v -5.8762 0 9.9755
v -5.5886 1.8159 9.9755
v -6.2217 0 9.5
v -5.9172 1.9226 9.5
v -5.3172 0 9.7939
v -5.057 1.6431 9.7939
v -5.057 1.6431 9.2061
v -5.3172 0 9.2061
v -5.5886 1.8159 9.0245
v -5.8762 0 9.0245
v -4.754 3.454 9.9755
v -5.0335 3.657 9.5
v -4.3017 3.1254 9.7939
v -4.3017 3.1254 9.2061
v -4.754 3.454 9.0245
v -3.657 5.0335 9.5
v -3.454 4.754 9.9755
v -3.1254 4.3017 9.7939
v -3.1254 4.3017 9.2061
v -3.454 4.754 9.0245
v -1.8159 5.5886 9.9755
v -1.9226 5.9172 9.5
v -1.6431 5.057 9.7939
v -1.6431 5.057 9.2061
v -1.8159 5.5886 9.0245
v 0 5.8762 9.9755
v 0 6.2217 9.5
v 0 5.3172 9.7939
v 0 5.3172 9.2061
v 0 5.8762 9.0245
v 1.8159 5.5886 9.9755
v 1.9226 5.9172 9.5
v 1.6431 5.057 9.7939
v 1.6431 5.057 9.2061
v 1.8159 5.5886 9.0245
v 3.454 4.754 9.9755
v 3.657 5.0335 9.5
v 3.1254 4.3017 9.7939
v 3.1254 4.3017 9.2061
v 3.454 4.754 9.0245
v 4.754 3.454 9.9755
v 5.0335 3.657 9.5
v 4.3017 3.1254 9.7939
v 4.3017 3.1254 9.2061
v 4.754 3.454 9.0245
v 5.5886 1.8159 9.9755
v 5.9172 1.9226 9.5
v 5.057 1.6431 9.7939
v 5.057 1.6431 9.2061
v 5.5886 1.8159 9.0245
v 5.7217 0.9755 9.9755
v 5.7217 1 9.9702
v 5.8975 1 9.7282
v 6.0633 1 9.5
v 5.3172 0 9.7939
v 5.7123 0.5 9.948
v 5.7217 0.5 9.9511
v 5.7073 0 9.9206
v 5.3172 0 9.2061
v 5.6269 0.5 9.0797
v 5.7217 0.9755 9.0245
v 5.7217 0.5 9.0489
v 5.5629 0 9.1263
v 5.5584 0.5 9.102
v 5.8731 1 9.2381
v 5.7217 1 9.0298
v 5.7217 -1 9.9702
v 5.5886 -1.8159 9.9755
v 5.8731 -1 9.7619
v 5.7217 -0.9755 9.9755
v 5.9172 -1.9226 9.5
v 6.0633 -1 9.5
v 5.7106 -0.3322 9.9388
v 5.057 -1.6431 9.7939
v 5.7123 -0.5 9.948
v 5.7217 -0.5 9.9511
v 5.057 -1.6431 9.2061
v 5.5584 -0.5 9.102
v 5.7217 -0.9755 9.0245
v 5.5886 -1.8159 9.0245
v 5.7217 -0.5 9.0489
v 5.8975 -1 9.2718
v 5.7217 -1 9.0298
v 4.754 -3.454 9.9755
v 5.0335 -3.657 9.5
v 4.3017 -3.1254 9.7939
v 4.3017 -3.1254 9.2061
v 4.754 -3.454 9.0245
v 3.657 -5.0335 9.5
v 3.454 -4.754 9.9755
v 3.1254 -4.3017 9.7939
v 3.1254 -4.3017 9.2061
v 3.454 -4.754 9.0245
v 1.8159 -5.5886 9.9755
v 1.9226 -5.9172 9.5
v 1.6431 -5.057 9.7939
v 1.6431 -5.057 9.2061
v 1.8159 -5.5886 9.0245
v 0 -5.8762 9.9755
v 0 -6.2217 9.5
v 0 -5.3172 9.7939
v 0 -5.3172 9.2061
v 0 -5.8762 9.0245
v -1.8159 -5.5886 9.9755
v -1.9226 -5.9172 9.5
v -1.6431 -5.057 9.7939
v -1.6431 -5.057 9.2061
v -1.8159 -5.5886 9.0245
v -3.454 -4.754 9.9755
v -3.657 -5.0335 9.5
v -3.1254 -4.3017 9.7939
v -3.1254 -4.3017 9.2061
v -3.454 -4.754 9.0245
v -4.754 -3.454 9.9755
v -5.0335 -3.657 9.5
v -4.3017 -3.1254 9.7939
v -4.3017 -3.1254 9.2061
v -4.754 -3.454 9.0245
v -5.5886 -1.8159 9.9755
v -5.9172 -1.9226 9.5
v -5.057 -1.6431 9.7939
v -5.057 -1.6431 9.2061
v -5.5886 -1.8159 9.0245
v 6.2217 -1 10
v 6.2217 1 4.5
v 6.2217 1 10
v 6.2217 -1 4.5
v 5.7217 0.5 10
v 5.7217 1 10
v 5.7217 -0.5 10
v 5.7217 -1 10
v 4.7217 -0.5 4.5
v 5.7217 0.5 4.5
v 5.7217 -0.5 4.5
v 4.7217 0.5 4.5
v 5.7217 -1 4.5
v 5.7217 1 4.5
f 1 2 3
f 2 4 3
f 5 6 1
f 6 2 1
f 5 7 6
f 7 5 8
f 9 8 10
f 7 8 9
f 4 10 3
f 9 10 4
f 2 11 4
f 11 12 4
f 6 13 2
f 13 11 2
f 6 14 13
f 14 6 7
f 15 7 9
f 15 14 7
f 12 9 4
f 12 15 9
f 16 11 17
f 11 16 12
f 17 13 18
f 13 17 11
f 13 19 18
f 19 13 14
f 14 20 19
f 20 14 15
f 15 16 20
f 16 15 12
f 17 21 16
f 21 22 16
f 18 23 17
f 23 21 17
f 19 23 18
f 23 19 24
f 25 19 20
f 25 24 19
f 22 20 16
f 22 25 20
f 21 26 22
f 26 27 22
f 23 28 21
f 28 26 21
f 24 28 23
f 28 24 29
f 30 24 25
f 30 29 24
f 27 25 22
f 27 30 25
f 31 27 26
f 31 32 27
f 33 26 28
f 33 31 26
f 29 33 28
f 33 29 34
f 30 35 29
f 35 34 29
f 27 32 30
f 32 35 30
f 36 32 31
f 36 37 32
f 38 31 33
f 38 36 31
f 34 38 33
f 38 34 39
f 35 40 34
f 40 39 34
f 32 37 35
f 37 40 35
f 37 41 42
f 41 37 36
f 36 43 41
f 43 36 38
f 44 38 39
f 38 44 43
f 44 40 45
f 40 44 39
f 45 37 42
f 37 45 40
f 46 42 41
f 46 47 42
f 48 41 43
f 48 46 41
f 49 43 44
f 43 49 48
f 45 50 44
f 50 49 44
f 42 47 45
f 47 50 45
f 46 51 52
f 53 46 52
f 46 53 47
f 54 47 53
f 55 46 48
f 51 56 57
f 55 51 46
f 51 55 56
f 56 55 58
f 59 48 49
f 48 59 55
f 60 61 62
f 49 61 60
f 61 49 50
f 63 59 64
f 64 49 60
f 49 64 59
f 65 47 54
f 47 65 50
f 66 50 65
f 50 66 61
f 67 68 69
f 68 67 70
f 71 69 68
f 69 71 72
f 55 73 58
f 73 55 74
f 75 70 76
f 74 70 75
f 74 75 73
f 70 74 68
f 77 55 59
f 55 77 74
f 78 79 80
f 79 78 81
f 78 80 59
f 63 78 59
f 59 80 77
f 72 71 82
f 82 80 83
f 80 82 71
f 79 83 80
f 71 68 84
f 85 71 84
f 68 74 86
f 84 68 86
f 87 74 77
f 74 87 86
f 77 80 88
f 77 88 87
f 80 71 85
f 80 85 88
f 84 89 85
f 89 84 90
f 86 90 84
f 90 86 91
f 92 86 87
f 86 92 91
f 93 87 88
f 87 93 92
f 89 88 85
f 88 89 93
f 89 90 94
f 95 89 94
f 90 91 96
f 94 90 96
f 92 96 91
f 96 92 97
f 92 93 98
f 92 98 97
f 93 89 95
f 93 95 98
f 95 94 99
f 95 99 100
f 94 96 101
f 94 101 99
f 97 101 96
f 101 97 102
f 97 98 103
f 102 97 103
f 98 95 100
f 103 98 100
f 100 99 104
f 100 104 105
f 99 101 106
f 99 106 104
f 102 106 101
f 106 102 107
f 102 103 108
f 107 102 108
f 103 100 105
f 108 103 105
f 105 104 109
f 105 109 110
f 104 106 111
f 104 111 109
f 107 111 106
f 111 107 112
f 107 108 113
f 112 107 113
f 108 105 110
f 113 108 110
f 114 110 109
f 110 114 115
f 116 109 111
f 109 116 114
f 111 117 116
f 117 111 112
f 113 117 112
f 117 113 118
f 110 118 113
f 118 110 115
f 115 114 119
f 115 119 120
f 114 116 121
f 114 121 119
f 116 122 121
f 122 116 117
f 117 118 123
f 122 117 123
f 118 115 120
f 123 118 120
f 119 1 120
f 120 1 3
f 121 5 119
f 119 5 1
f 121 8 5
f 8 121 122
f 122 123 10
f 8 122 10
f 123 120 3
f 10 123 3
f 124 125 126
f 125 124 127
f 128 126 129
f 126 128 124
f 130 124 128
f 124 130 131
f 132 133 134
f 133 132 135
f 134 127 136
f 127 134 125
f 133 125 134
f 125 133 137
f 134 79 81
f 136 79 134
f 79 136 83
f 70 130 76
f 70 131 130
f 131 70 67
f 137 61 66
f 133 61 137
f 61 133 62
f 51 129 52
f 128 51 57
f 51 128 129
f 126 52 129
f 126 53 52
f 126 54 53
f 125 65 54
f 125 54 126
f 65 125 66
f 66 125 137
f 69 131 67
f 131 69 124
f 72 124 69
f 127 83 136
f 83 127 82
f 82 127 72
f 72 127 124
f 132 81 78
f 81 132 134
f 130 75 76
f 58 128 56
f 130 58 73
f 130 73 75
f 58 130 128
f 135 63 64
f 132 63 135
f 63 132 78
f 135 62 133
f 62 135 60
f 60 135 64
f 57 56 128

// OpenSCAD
// Three touching bodies: a revolved ring, a plate on its outside, and a
// wedge sharing the plate's face. OCCT's plain fuse silently dropped the
// plate here (its volume stayed within the bounds the inputs imply and
// the piece count did not rise), so the union is also checked for
// operands that are no longer inside the result.
ringRadius = 5.72171;
union() {
  translate([0, 0, 9.5]) rotate_extrude() translate([ringRadius, 0]) circle(r = 0.5);
  translate([ringRadius, -1, 4.5]) cube([0.5, 2, 5.5]);
  translate([ringRadius, -0.5, 4.5]) rotate([90, 0, 180]) linear_extrude(1)
    polygon([[0, 0], [0, 5.5], [1, 0]]);
}
